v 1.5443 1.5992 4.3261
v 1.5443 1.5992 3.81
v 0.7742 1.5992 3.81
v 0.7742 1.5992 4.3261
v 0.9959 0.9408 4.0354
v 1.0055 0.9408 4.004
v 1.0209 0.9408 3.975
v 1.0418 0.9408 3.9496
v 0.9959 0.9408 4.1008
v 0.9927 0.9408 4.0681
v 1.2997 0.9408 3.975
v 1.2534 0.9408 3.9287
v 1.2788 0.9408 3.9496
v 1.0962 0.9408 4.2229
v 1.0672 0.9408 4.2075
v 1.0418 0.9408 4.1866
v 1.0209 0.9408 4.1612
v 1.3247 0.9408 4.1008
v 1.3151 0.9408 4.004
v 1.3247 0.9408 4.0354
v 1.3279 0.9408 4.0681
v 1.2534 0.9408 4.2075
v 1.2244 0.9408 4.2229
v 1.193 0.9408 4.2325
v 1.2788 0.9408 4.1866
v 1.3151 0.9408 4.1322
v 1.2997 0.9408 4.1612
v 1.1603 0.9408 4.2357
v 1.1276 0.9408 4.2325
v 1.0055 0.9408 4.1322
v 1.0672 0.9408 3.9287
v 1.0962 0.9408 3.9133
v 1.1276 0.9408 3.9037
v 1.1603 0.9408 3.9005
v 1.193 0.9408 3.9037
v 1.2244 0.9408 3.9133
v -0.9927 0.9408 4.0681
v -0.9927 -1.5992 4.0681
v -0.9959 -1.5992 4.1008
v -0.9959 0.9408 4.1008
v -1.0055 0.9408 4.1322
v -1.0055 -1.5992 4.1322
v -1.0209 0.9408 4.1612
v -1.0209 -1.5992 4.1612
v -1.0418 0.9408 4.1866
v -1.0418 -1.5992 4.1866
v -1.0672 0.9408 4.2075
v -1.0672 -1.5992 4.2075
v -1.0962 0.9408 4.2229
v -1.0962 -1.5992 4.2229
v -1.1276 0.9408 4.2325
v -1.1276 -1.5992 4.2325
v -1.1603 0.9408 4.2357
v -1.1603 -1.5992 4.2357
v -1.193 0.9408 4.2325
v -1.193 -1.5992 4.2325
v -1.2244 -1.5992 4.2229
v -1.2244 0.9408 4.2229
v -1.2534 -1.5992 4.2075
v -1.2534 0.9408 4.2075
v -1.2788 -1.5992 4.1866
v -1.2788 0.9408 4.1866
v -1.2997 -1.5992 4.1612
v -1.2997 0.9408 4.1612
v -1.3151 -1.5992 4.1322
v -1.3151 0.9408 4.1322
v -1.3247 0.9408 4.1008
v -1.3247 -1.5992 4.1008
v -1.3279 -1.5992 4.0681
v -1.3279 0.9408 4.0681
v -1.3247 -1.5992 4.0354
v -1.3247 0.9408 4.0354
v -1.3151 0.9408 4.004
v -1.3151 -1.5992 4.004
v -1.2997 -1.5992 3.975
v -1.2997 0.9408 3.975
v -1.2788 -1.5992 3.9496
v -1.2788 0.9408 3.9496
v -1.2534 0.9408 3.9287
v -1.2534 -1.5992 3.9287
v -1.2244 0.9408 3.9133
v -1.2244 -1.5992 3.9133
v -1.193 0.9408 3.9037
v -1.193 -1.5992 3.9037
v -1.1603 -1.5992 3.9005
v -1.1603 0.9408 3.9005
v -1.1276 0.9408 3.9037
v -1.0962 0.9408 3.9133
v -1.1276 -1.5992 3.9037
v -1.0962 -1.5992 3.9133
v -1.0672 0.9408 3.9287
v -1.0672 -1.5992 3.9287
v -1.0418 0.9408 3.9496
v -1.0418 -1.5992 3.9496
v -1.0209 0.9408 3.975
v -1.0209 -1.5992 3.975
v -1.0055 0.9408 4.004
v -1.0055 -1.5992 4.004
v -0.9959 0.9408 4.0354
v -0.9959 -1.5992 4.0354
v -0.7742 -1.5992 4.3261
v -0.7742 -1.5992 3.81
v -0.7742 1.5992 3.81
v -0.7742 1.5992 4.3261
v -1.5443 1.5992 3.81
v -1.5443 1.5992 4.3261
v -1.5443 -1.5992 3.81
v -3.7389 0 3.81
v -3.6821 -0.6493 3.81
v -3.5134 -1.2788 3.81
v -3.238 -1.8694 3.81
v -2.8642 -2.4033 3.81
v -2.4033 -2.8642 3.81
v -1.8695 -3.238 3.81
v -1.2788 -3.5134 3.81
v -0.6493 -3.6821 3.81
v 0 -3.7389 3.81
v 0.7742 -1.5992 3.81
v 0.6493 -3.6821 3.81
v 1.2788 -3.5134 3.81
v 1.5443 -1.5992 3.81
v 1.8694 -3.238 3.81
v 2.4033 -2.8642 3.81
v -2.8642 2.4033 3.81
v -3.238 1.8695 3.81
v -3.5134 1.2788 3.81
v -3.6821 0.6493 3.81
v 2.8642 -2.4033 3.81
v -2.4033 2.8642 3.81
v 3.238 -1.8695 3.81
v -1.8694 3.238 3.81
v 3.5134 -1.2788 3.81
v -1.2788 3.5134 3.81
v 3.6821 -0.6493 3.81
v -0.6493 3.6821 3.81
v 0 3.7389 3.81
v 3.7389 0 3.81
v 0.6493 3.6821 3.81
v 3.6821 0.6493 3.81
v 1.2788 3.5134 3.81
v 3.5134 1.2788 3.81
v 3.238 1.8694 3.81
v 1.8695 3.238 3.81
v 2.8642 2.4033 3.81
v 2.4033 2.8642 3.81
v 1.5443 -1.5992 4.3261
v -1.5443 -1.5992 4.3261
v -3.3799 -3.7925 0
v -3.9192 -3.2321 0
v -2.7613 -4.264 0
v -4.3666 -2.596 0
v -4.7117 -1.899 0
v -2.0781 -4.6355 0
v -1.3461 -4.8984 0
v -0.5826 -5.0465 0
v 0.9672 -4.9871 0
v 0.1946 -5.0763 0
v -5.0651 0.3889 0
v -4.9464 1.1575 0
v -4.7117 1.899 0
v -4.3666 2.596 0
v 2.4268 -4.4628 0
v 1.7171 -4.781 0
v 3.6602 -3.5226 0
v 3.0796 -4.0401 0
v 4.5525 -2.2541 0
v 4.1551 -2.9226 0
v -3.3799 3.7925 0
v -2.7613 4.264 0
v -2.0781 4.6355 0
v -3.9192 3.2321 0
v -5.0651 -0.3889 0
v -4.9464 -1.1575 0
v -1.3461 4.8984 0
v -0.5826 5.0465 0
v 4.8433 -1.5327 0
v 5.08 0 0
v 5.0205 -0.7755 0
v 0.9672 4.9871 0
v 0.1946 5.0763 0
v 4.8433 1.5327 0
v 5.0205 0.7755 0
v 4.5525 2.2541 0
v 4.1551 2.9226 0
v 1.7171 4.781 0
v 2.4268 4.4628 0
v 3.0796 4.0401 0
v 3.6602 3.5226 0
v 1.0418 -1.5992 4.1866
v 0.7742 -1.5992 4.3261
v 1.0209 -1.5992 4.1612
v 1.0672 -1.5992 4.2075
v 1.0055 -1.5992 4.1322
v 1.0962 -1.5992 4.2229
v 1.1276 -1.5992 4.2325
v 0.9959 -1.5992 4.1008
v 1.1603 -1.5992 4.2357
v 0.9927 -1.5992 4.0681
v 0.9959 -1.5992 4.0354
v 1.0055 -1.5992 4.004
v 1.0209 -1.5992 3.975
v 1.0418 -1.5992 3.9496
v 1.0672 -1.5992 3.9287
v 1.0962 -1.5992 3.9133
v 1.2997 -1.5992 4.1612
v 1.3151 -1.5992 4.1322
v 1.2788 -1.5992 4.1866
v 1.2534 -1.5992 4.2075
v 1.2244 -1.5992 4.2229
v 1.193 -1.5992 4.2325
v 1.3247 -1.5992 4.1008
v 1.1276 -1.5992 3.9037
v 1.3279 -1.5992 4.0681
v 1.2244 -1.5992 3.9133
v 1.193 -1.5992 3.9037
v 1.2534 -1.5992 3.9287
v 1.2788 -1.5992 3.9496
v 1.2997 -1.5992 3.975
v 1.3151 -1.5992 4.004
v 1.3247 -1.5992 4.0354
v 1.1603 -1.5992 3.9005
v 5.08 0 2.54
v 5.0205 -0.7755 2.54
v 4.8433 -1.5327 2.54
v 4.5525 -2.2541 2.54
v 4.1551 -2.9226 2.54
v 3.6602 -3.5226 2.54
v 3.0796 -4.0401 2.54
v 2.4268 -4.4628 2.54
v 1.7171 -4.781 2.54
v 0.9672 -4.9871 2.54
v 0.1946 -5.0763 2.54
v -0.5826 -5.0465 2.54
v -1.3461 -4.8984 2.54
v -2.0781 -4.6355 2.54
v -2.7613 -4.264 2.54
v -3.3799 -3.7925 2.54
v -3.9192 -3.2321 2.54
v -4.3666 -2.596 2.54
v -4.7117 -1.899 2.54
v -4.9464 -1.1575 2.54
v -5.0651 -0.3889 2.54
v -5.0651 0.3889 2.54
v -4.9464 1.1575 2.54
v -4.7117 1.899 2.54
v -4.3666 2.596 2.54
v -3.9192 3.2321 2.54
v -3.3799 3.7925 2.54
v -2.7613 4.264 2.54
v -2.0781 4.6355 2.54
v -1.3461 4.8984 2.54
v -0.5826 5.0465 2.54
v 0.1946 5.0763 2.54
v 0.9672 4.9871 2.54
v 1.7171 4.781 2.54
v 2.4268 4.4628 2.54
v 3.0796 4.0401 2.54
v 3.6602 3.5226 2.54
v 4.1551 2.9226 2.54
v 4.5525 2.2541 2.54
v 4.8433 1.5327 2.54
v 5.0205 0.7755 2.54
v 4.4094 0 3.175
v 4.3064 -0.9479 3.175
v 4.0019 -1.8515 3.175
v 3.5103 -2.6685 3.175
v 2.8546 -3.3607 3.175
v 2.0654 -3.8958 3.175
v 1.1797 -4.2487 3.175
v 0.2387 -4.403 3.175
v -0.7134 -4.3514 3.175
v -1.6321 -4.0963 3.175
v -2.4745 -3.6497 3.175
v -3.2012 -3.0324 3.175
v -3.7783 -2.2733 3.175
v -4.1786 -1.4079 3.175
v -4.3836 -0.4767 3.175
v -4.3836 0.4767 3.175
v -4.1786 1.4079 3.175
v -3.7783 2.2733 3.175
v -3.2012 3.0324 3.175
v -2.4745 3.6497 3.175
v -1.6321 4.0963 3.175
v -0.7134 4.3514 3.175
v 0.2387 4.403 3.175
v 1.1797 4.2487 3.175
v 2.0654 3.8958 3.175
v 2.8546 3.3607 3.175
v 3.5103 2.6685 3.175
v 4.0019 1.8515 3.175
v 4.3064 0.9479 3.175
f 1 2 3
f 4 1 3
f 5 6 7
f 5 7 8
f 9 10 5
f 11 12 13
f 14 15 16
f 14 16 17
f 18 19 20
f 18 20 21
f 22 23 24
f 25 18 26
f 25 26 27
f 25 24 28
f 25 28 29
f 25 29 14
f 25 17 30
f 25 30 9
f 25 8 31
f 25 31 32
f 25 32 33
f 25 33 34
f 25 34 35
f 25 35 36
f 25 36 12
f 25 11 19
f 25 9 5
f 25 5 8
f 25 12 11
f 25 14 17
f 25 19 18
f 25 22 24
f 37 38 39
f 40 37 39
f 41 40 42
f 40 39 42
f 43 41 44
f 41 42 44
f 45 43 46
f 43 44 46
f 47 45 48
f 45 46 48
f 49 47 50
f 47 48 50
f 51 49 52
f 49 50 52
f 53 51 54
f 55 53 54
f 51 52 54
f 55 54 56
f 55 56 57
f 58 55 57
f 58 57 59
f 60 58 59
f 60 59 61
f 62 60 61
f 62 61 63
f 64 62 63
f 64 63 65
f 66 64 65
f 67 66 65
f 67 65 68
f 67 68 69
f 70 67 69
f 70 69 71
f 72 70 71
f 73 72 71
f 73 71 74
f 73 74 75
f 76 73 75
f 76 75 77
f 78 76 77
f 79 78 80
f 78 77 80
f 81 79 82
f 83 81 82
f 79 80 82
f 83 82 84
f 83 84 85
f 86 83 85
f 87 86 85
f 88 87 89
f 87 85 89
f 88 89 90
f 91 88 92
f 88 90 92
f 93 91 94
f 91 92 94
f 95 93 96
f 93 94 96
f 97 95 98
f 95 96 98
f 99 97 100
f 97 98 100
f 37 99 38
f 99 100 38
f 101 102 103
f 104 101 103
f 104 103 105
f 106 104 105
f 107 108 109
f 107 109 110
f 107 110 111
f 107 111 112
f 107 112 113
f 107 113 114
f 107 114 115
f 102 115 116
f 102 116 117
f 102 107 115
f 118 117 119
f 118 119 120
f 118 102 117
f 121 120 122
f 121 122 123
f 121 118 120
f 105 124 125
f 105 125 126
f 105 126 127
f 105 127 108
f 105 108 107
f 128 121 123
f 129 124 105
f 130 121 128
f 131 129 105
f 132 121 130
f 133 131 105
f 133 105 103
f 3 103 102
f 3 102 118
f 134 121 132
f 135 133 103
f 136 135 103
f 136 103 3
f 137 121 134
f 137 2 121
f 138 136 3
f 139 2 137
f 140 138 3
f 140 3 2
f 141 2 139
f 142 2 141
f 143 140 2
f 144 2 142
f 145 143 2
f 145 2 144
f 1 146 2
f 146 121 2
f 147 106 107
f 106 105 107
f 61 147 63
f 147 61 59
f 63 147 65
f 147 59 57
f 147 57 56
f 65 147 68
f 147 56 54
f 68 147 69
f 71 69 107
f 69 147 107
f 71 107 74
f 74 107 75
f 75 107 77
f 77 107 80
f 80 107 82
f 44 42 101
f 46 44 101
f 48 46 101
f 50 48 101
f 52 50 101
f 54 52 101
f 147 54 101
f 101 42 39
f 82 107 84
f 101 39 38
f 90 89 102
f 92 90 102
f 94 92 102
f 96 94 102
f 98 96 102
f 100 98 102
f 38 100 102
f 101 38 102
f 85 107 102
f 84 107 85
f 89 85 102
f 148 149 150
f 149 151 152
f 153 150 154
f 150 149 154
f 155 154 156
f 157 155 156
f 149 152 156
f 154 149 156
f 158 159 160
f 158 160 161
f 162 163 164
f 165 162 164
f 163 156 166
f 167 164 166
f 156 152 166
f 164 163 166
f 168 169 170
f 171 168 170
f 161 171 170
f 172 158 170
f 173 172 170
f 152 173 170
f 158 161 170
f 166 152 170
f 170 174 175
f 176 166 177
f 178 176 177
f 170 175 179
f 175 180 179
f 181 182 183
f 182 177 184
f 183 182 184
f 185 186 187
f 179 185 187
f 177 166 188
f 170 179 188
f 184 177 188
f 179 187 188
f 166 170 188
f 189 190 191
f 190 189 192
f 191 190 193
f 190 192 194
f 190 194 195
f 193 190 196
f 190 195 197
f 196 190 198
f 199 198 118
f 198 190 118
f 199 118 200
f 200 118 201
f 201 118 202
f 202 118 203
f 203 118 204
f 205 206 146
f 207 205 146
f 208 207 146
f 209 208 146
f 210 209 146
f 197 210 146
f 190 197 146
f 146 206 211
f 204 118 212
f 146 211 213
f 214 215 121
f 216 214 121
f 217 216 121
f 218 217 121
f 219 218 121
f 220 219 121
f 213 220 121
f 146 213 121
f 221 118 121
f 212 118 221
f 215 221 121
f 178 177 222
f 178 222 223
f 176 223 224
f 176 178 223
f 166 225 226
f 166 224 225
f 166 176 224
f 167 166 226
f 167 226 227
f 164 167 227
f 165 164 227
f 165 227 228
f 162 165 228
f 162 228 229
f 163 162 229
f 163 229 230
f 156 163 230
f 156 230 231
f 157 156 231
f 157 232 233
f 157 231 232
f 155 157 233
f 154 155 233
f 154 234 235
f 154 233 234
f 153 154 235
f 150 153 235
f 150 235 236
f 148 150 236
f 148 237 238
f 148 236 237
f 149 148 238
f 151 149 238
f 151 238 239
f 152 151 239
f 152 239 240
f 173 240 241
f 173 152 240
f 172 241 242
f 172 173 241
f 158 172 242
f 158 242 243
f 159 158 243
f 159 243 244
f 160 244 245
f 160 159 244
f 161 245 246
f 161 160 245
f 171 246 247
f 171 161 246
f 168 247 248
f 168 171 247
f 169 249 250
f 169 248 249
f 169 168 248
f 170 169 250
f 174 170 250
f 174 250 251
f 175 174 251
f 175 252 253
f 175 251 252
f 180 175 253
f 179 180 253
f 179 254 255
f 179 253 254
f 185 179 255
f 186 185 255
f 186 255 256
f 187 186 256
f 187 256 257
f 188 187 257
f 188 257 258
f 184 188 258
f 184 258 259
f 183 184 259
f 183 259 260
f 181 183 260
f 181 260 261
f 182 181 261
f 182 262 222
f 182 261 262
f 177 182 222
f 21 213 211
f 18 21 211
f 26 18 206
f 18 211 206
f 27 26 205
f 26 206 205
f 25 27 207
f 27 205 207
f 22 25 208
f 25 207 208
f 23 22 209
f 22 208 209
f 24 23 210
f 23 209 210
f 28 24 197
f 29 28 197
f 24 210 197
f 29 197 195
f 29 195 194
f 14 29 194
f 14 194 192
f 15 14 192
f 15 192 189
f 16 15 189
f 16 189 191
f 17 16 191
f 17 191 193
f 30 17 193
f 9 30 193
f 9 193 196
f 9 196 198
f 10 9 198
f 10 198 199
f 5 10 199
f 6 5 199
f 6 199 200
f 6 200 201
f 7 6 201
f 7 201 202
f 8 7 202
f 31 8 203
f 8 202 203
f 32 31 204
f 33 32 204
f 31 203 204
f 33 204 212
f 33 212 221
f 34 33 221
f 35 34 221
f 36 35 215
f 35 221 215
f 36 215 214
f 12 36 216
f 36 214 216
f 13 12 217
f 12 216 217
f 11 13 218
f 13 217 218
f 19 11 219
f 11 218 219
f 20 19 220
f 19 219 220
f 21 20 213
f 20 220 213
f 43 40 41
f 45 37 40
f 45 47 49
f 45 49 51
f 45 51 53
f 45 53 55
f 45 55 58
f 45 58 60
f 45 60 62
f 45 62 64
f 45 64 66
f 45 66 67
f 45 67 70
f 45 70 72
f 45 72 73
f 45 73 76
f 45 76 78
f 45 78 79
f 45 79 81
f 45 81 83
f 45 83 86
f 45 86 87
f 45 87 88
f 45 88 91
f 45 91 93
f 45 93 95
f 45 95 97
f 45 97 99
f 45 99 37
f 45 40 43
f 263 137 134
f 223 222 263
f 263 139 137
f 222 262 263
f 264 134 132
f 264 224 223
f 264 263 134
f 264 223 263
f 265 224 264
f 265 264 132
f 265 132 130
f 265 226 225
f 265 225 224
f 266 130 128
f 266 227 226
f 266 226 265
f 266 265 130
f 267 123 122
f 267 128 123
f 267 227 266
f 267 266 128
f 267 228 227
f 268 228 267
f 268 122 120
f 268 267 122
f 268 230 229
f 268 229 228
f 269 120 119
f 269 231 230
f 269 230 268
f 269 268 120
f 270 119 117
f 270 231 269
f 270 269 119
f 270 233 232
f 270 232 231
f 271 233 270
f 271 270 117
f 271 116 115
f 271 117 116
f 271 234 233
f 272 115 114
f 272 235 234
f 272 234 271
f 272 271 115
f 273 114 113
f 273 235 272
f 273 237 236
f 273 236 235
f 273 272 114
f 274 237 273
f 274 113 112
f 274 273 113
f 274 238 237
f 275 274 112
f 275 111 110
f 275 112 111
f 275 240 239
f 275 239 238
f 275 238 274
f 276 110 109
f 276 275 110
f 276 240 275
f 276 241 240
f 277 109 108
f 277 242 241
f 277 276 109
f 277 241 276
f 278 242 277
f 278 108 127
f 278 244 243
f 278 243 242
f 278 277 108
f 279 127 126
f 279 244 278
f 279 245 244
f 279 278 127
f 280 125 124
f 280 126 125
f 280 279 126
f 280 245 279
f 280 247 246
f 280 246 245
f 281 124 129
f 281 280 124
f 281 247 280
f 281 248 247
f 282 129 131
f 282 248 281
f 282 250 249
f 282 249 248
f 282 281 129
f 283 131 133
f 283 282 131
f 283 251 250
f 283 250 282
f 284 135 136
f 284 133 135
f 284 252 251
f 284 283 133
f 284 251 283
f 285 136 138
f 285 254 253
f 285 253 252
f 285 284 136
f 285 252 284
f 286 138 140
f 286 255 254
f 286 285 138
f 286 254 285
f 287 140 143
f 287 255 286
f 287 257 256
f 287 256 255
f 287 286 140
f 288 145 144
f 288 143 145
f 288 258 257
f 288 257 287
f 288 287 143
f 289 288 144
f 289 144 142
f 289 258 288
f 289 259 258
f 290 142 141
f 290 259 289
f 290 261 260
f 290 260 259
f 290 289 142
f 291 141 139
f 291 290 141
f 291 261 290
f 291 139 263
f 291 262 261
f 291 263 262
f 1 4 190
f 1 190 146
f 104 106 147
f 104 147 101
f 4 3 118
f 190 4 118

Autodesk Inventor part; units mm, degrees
ref_plane "YZ Plane" through (0, 0, 0) normal (1, 0, 0) x (0, 1, 0)
ref_plane "XZ Plane" through (0, 0, 0) normal (0, 1, 0) x (-1, 0, 0)
sketch "Sketch3" plane through (0, 0, 0) normal (0, 0, 1) x (1, 0, 0)
  circle A0 centre (0, 0) radius 5.08
  dimension "d0" = 10.16
extrude "Extrusion1" add sketch "Sketch3" along normal blind 2.54
ref_plane "Work Plane1" through (0, 0, 3.81) normal (0, 0, 1) x (1, 0, 0)
sketch "Sketch4" plane through (0, 0, 3.81) normal (0, 0, 1) x (1, 0, 0)
  circle A0 centre (0, 0) radius 3.7389
  dimension "d4" = 7.4778
loft "Loft1" add profiles "Sketch4" section 2 edges at (-5.08, 0, 2.54)
sketch "Sketch5" plane through (0, 0, 3.81) normal (0, 0, 1) x (1, 0, 0)
  line L0 (-1.5443, -1.5992) -> (-0.7742, -1.5992)
  line L1 (-0.7742, -1.5992) -> (-0.7742, 1.5992)
  line L2 (-0.7742, 1.5992) -> (-1.5443, 1.5992)
  line L3 (-1.5443, 1.5992) -> (-1.5443, -1.5992)
  line L4 (0.7742, -1.5992) -> (1.5443, -1.5992)
  line L5 (1.5443, -1.5992) -> (1.5443, 1.5992)
  line L6 (1.5443, 1.5992) -> (0.7742, 1.5992)
  line L7 (0.7742, 1.5992) -> (0.7742, -1.5992)
  point P0 (0, 0)
  dimension "d9" = 0.7742
  dimension "d10" = 0.7742
  dimension "d11" = 1.5443
  dimension "d12" = 1.5443
  dimension "d23" = 1.5992
  dimension "d24" = 1.5992
extrude "Extrusion2" add sketch "Sketch5" along normal blind 0.5161
sketch "Sketch6" plane through (-1.5443, -1.5992, 3.81) normal (0, -1, 0) x (1, 0, 0)
  circle A0 centre (0.384, 0.2581) radius 0.1676
  circle A1 centre (2.7046, 0.2581) radius 0.1676
  line L0 (0.7701, 0) -> (0.7701, 0.5161) projected
  line L1 (2.3185, 0) -> (2.3185, 0.5161) projected
  line L2 (-2.1946, 0) -> (5.2832, 0) projected
  point P0 (1.5443, -3.81)
  dimension "d15" = 0.3353
  dimension "d16" = 0.3353
  dimension "d17" = 0.3861
  dimension "d18" = 0.3861
  dimension "d25" = 0.2581
  dimension "d26" = 0.2581
  dimension "d27" = 0.5161
extrude "Extrusion3" cut sketch "Sketch6" against normal blind 2.54
equation "\"d4\" = 0.736 * d0"
equation "\"d9\" = 0.0762 * d0"
equation "\"d10\" = d9"
equation "\"d11\" = 0.152 * d0"
equation "\"d12\" = d11"
equation "\"d23\" = 0.1574 * d0"
equation "\"d24\" = d23"
equation "\"d13\" = 0.0508 * d0"
equation "\"d15\" = 0.033 * d0"
equation "\"d16\" = d15"
equation "\"d17\" = 0.038 * d0"
equation "\"d18\" = d17"
equation "\"d25\" = 0.5 * d27"
equation "\"d26\" = d25"
properties part number "Dynamic Driver"
